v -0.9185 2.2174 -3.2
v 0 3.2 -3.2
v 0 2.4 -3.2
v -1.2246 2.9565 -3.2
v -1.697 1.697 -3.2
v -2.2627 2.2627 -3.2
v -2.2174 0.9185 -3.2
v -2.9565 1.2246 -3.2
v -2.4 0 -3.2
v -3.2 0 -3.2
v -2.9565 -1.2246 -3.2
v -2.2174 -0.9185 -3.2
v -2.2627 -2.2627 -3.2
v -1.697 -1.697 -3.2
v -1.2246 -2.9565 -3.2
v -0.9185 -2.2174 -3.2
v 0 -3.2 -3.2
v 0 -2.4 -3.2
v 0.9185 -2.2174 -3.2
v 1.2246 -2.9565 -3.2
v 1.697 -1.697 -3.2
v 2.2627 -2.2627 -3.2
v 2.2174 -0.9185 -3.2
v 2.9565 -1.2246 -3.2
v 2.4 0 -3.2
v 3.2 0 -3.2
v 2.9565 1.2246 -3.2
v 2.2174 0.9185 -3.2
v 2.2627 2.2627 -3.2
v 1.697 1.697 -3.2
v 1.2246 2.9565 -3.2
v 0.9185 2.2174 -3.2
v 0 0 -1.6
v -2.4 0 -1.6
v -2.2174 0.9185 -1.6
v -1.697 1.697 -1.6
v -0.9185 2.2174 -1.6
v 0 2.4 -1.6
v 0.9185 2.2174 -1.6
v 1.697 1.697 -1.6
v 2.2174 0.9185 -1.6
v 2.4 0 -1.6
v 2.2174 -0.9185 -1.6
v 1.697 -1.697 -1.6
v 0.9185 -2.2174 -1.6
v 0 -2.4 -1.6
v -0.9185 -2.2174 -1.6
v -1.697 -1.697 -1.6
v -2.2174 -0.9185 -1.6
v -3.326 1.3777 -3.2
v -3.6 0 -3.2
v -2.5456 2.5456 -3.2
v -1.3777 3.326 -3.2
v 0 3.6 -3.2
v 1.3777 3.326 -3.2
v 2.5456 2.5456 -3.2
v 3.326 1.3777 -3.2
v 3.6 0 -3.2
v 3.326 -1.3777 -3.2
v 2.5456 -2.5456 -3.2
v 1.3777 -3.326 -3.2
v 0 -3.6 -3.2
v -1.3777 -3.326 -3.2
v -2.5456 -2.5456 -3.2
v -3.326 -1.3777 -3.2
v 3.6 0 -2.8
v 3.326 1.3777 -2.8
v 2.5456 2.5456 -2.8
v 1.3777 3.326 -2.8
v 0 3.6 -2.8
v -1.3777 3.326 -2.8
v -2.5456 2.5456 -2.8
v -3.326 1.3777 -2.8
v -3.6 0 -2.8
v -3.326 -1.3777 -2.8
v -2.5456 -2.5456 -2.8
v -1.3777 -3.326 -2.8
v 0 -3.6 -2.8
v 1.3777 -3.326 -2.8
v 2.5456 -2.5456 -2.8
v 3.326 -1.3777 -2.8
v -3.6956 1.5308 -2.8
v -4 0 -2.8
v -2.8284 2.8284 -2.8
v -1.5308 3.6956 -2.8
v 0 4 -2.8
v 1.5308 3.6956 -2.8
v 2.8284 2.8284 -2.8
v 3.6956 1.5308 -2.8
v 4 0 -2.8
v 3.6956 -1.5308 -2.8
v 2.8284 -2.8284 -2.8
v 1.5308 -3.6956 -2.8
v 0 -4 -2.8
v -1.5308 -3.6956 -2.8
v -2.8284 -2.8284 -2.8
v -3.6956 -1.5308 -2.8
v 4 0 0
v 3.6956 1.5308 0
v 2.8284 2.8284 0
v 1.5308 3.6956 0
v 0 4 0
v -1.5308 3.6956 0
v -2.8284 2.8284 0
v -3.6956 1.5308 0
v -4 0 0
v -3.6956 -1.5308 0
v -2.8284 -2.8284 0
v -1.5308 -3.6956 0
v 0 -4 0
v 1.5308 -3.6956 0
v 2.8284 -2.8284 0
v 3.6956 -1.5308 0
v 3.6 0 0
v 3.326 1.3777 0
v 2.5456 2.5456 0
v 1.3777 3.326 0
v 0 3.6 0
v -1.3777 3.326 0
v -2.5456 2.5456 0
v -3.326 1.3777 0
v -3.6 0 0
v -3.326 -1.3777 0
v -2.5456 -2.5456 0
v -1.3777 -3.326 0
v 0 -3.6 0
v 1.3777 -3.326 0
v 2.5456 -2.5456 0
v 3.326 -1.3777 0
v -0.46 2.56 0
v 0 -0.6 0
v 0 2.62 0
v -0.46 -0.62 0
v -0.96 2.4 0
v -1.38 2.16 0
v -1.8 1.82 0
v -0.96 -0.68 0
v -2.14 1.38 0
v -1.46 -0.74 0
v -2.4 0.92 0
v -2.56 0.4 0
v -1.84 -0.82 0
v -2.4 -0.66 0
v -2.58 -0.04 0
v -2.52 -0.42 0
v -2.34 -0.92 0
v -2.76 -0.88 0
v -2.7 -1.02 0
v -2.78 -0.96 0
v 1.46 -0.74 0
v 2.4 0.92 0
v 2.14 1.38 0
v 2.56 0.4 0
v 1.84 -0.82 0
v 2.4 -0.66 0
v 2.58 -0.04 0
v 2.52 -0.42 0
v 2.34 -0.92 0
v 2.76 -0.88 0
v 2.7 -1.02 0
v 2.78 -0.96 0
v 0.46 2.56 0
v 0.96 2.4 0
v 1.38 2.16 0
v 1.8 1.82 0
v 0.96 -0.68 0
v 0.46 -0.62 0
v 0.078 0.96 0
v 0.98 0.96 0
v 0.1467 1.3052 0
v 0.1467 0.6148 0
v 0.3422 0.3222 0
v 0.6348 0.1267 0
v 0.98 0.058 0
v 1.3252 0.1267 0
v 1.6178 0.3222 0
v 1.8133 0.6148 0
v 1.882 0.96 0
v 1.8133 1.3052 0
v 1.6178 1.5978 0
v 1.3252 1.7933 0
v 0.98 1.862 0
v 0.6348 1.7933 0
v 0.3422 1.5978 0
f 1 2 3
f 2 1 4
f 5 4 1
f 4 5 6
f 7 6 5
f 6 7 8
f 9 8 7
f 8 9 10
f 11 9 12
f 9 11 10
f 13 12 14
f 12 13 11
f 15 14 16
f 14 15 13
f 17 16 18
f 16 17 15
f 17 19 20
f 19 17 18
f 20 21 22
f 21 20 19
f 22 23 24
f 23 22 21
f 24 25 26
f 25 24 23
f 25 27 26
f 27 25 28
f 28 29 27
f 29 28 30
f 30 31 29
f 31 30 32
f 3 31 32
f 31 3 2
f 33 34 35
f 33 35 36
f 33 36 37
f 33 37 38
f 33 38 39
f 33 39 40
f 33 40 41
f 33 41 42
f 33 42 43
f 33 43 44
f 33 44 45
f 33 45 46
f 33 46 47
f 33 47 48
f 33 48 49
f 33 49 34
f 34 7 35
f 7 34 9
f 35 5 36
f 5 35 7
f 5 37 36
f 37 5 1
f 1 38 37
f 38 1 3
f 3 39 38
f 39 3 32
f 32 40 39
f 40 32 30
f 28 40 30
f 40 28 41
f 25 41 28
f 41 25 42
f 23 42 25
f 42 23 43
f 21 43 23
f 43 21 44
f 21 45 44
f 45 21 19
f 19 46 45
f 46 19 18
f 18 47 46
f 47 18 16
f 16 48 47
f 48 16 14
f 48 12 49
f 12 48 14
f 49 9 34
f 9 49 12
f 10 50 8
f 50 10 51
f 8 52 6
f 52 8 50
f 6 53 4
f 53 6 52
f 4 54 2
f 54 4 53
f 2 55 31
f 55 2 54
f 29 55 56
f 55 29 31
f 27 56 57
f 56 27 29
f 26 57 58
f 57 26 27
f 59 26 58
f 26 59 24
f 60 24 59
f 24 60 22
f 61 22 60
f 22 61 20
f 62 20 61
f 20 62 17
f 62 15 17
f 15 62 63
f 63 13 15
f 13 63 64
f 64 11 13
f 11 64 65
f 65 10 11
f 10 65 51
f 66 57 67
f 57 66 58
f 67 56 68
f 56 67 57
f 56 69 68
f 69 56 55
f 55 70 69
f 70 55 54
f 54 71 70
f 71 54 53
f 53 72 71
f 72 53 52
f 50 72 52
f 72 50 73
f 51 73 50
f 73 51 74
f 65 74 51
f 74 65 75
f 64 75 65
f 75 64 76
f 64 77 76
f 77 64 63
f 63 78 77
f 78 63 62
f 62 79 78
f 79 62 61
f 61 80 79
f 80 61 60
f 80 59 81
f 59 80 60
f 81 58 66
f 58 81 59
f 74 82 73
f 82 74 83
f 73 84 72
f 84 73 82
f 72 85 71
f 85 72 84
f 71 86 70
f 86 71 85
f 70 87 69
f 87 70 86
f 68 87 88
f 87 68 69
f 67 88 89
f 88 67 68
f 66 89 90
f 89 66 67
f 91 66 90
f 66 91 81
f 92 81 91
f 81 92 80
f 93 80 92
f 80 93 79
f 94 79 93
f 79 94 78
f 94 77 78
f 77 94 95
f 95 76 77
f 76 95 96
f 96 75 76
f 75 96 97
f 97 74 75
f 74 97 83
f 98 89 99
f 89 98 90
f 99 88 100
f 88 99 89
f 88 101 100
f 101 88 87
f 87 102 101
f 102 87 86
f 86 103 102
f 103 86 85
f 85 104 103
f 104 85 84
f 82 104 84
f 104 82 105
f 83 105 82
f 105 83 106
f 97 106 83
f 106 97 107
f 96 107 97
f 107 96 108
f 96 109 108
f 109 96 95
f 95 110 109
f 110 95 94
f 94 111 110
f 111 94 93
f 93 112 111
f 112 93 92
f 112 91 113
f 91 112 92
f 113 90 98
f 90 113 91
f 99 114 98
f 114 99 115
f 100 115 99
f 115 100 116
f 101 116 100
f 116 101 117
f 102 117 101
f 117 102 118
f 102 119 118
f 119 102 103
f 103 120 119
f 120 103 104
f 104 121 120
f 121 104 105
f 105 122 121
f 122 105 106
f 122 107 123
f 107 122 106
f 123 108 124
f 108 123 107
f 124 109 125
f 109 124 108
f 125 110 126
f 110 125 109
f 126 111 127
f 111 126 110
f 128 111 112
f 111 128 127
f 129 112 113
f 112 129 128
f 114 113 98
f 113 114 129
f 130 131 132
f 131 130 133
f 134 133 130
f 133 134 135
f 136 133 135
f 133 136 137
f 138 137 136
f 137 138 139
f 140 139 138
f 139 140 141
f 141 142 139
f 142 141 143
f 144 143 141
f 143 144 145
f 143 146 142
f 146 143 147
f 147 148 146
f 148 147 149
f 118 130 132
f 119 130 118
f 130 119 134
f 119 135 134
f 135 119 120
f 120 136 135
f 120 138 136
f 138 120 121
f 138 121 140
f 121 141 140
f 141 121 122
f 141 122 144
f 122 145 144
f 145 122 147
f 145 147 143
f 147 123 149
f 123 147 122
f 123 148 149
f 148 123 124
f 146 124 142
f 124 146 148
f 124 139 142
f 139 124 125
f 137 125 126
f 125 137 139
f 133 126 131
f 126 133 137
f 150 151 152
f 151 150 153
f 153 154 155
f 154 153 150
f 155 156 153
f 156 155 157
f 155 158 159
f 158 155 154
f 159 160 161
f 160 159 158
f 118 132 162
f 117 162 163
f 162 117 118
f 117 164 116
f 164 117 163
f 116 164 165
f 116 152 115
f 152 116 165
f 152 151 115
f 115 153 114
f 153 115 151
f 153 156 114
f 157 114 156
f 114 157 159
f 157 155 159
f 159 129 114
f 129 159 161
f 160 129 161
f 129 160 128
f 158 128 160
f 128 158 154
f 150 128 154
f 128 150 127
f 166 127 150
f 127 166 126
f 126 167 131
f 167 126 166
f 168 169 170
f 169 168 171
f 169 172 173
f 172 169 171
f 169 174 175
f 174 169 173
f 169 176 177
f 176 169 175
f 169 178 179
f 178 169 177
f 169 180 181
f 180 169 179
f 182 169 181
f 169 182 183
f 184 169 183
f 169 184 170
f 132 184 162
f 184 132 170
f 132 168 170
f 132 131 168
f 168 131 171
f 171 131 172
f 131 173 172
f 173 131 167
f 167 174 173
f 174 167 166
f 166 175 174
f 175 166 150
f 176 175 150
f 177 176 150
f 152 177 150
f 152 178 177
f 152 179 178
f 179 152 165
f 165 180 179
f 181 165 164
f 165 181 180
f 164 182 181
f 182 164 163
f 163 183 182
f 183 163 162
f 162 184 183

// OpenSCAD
use <../lib.scad>
use <../p/4-4ering.scad>
use <s/98138s01.scad>
$fa=1; $fs=0.2;
function ldraw_lib__98138p0b(realsolid=false) = [
// 0 Tile  1 x  1 Round with Eye Half Closed Pattern
// 0 Name: 98138p0b.dat
// 0 Author: Philippe Hurbain [Philo]
// 0 !LDRAW_ORG Part UPDATE 2015-01
// 0 !LICENSE Licensed under CC BY 2.0 and CC BY 4.0 : see CAreadme.txt
// 
// 0 BFC CERTIFY CCW
  [0,"BFC","CERTIFY"],
  [0,"BFC","CCW"],
// 
// 0 !HISTORY 2015-10-11 [PTadmin] Official Update 2015-01
// 
// 
// 1 16 0 0 0 1 0 0 0 1 0 0 0 1 s\98138s01.dat
  [1,16,0,0,0,1,0,0,0,1,0,0,0,1, ldraw_lib__s__98138s01(realsolid)],
// 1 16 0 0 0 9 0 0 0 1 0 0 0 9 4-4ering.dat
  [1,16,0,0,0,9,0,0,0,1,0,0,0,9, ldraw_lib__4_4ering(realsolid)],
// 4 0 -1.15 0 -1.55 0 0 -1.5 0 0 6.55 -1.15 0 6.4
  [4,0,-1.15,0,-1.55,0,0,-1.5,0,0,6.55,-1.15,0,6.4],
// 4 0 -1.15 0 -1.55 -1.15 0 6.4 -2.4 0 6 -3.45 0 5.4
  [4,0,-1.15,0,-1.55,-1.15,0,6.4,-2.4,0,6,-3.45,0,5.4],
// 4 0 -2.4 0 -1.7 -1.15 0 -1.55 -3.45 0 5.4 -4.5 0 4.55
  [4,0,-2.4,0,-1.7,-1.15,0,-1.55,-3.45,0,5.4,-4.5,0,4.55],
// 4 0 -2.4 0 -1.7 -4.5 0 4.55 -5.35 0 3.45 -3.65 0 -1.85
  [4,0,-2.4,0,-1.7,-4.5,0,4.55,-5.35,0,3.45,-3.65,0,-1.85],
// 4 0 -3.65 0 -1.85 -5.35 0 3.45 -6 0 2.3 -6.4 0 1
  [4,0,-3.65,0,-1.85,-5.35,0,3.45,-6,0,2.3,-6.4,0,1],
// 4 0 -4.6 0 -2.05 -3.65 0 -1.85 -6.4 0 1 -6 0 -1.65
  [4,0,-4.6,0,-2.05,-3.65,0,-1.85,-6.4,0,1,-6,0,-1.65],
// 4 0 -6 0 -1.65 -6.4 0 1 -6.45 0 -0.1 -6.3 0 -1.05
  [4,0,-6,0,-1.65,-6.4,0,1,-6.45,0,-0.1,-6.3,0,-1.05],
// 4 0 -5.85 0 -2.3 -4.6 0 -2.05 -6 0 -1.65 -6.9 0 -2.2
  [4,0,-5.85,0,-2.3,-4.6,0,-2.05,-6,0,-1.65,-6.9,0,-2.2],
// 4 0 -6.75 0 -2.55 -5.85 0 -2.3 -6.9 0 -2.2 -6.95 0 -2.4
  [4,0,-6.75,0,-2.55,-5.85,0,-2.3,-6.9,0,-2.2,-6.95,0,-2.4],
// 3 16 0 0 9 -1.15 0 6.4 0 0 6.55
  [3,16,0,0,9,-1.15,0,6.4,0,0,6.55],
// 4 16 -2.4 0 6 -1.15 0 6.4 0 0 9 -3.4443 0 8.3151
  [4,16,-2.4,0,6,-1.15,0,6.4,0,0,9,-3.4443,0,8.3151],
// 4 16 -3.45 0 5.4 -2.4 0 6 -3.4443 0 8.3151 -6.3639 0 6.3639
  [4,16,-3.45,0,5.4,-2.4,0,6,-3.4443,0,8.3151,-6.3639,0,6.3639],
// 3 16 -6.3639 0 6.3639 -4.5 0 4.55 -3.45 0 5.4
  [3,16,-6.3639,0,6.3639,-4.5,0,4.55,-3.45,0,5.4],
// 4 16 -5.35 0 3.45 -4.5 0 4.55 -6.3639 0 6.3639 -8.3151 0 3.4443
  [4,16,-5.35,0,3.45,-4.5,0,4.55,-6.3639,0,6.3639,-8.3151,0,3.4443],
// 3 16 -5.35 0 3.45 -8.3151 0 3.4443 -6 0 2.3
  [3,16,-5.35,0,3.45,-8.3151,0,3.4443,-6,0,2.3],
// 4 16 -6.4 0 1 -6 0 2.3 -8.3151 0 3.4443 -9 0 0
  [4,16,-6.4,0,1,-6,0,2.3,-8.3151,0,3.4443,-9,0,0],
// 3 16 -6.4 0 1 -9 0 0 -6.45 0 -0.1
  [3,16,-6.4,0,1,-9,0,0,-6.45,0,-0.1],
// 4 16 -6.3 0 -1.05 -6.45 0 -0.1 -9 0 0 -6.9 0 -2.2
  [4,16,-6.3,0,-1.05,-6.45,0,-0.1,-9,0,0,-6.9,0,-2.2],
// 3 16 -6.3 0 -1.05 -6.9 0 -2.2 -6 0 -1.65
  [3,16,-6.3,0,-1.05,-6.9,0,-2.2,-6,0,-1.65],
// 4 16 -6.95 0 -2.4 -6.9 0 -2.2 -9 0 0 -8.3151 0 -3.4443
  [4,16,-6.95,0,-2.4,-6.9,0,-2.2,-9,0,0,-8.3151,0,-3.4443],
// 4 16 -6.75 0 -2.55 -6.95 0 -2.4 -8.3151 0 -3.4443 -6.3639 0 -6.3639
  [4,16,-6.75,0,-2.55,-6.95,0,-2.4,-8.3151,0,-3.4443,-6.3639,0,-6.3639],
// 4 16 -5.85 0 -2.3 -6.75 0 -2.55 -6.3639 0 -6.3639 -4.6 0 -2.05
  [4,16,-5.85,0,-2.3,-6.75,0,-2.55,-6.3639,0,-6.3639,-4.6,0,-2.05],
// 4 16 -4.6 0 -2.05 -6.3639 0 -6.3639 -3.4443 0 -8.3151 -3.65 0 -1.85
  [4,16,-4.6,0,-2.05,-6.3639,0,-6.3639,-3.4443,0,-8.3151,-3.65,0,-1.85],
// 4 16 -2.4 0 -1.7 -3.65 0 -1.85 -3.4443 0 -8.3151 0 0 -9
  [4,16,-2.4,0,-1.7,-3.65,0,-1.85,-3.4443,0,-8.3151,0,0,-9],
// 4 16 -1.15 0 -1.55 -2.4 0 -1.7 0 0 -9 0 0 -1.5
  [4,16,-1.15,0,-1.55,-2.4,0,-1.7,0,0,-9,0,0,-1.5],
// 4 0 6 0 2.3 5.35 0 3.45 3.65 0 -1.85 6.4 0 1
  [4,0,6,0,2.3,5.35,0,3.45,3.65,0,-1.85,6.4,0,1],
// 4 0 6.4 0 1 3.65 0 -1.85 4.6 0 -2.05 6 0 -1.65
  [4,0,6.4,0,1,3.65,0,-1.85,4.6,0,-2.05,6,0,-1.65],
// 4 0 6.45 0 -0.1 6.4 0 1 6 0 -1.65 6.3 0 -1.05
  [4,0,6.45,0,-0.1,6.4,0,1,6,0,-1.65,6.3,0,-1.05],
// 4 0 6 0 -1.65 4.6 0 -2.05 5.85 0 -2.3 6.9 0 -2.2
  [4,0,6,0,-1.65,4.6,0,-2.05,5.85,0,-2.3,6.9,0,-2.2],
// 4 0 6.9 0 -2.2 5.85 0 -2.3 6.75 0 -2.55 6.95 0 -2.4
  [4,0,6.9,0,-2.2,5.85,0,-2.3,6.75,0,-2.55,6.95,0,-2.4],
// 3 16 0 0 9 0 0 6.55 1.15 0 6.4
  [3,16,0,0,9,0,0,6.55,1.15,0,6.4],
// 4 16 0 0 9 1.15 0 6.4 2.4 0 6 3.4443 0 8.3151
  [4,16,0,0,9,1.15,0,6.4,2.4,0,6,3.4443,0,8.3151],
// 4 16 3.4443 0 8.3151 2.4 0 6 3.45 0 5.4 6.3639 0 6.3639
  [4,16,3.4443,0,8.3151,2.4,0,6,3.45,0,5.4,6.3639,0,6.3639],
// 3 16 6.3639 0 6.3639 3.45 0 5.4 4.5 0 4.55
  [3,16,6.3639,0,6.3639,3.45,0,5.4,4.5,0,4.55],
// 4 16 6.3639 0 6.3639 4.5 0 4.55 5.35 0 3.45 8.3151 0 3.4443
  [4,16,6.3639,0,6.3639,4.5,0,4.55,5.35,0,3.45,8.3151,0,3.4443],
// 3 16 5.35 0 3.45 6 0 2.3 8.3151 0 3.4443
  [3,16,5.35,0,3.45,6,0,2.3,8.3151,0,3.4443],
// 4 16 8.3151 0 3.4443 6 0 2.3 6.4 0 1 9 0 0
  [4,16,8.3151,0,3.4443,6,0,2.3,6.4,0,1,9,0,0],
// 3 16 6.4 0 1 6.45 0 -0.1 9 0 0
  [3,16,6.4,0,1,6.45,0,-0.1,9,0,0],
// 4 16 9 0 0 6.45 0 -0.1 6.3 0 -1.05 6.9 0 -2.2
  [4,16,9,0,0,6.45,0,-0.1,6.3,0,-1.05,6.9,0,-2.2],
// 3 16 6.3 0 -1.05 6 0 -1.65 6.9 0 -2.2
  [3,16,6.3,0,-1.05,6,0,-1.65,6.9,0,-2.2],
// 4 16 9 0 0 6.9 0 -2.2 6.95 0 -2.4 8.3151 0 -3.4443
  [4,16,9,0,0,6.9,0,-2.2,6.95,0,-2.4,8.3151,0,-3.4443],
// 4 16 8.3151 0 -3.4443 6.95 0 -2.4 6.75 0 -2.55 6.3639 0 -6.3639
  [4,16,8.3151,0,-3.4443,6.95,0,-2.4,6.75,0,-2.55,6.3639,0,-6.3639],
// 4 16 6.3639 0 -6.3639 6.75 0 -2.55 5.85 0 -2.3 4.6 0 -2.05
  [4,16,6.3639,0,-6.3639,6.75,0,-2.55,5.85,0,-2.3,4.6,0,-2.05],
// 4 16 3.4443 0 -8.3151 6.3639 0 -6.3639 4.6 0 -2.05 3.65 0 -1.85
  [4,16,3.4443,0,-8.3151,6.3639,0,-6.3639,4.6,0,-2.05,3.65,0,-1.85],
// 4 16 3.4443 0 -8.3151 3.65 0 -1.85 2.4 0 -1.7 0 0 -9
  [4,16,3.4443,0,-8.3151,3.65,0,-1.85,2.4,0,-1.7,0,0,-9],
// 4 16 0 0 -9 2.4 0 -1.7 1.15 0 -1.55 0 0 -1.5
  [4,16,0,0,-9,2.4,0,-1.7,1.15,0,-1.55,0,0,-1.5],
// 4 16 2.45 0 2.4 0.3667 0 3.263 0.195 0 2.4 0.3667 0 1.537
  [4,16,2.45,0,2.4,0.3667,0,3.263,0.195,0,2.4,0.3667,0,1.537],
// 4 16 2.45 0 2.4 0.3667 0 1.537 0.8555 0 0.8055 1.587 0 0.3167
  [4,16,2.45,0,2.4,0.3667,0,1.537,0.8555,0,0.8055,1.587,0,0.3167],
// 4 16 2.45 0 2.4 1.587 0 0.3167 2.45 0 0.145 3.313 0 0.3167
  [4,16,2.45,0,2.4,1.587,0,0.3167,2.45,0,0.145,3.313,0,0.3167],
// 4 16 2.45 0 2.4 3.313 0 0.3167 4.0445 0 0.8055 4.5333 0 1.537
  [4,16,2.45,0,2.4,3.313,0,0.3167,4.0445,0,0.8055,4.5333,0,1.537],
// 4 16 2.45 0 2.4 4.5333 0 1.537 4.705 0 2.4 4.5333 0 3.263
  [4,16,2.45,0,2.4,4.5333,0,1.537,4.705,0,2.4,4.5333,0,3.263],
// 4 16 2.45 0 2.4 4.5333 0 3.263 4.0445 0 3.9945 3.313 0 4.4833
  [4,16,2.45,0,2.4,4.5333,0,3.263,4.0445,0,3.9945,3.313,0,4.4833],
// 4 16 2.45 0 2.4 3.313 0 4.4833 2.45 0 4.655 1.587 0 4.4833
  [4,16,2.45,0,2.4,3.313,0,4.4833,2.45,0,4.655,1.587,0,4.4833],
// 4 16 2.45 0 2.4 1.587 0 4.4833 0.8555 0 3.9945 0.3667 0 3.263
  [4,16,2.45,0,2.4,1.587,0,4.4833,0.8555,0,3.9945,0.3667,0,3.263],
// 4 0 0 0 6.55 0.3667 0 3.263 0.8555 0 3.9945 1.15 0 6.4
  [4,0,0,0,6.55,0.3667,0,3.263,0.8555,0,3.9945,1.15,0,6.4],
// 3 0 0 0 6.55 0.195 0 2.4 0.3667 0 3.263
  [3,0,0,0,6.55,0.195,0,2.4,0.3667,0,3.263],
// 3 0 0 0 6.55 0 0 -1.5 0.195 0 2.4
  [3,0,0,0,6.55,0,0,-1.5,0.195,0,2.4],
// 3 0 0.195 0 2.4 0 0 -1.5 0.3667 0 1.537
  [3,0,0.195,0,2.4,0,0,-1.5,0.3667,0,1.537],
// 3 0 0.3667 0 1.537 0 0 -1.5 0.8555 0 0.8055
  [3,0,0.3667,0,1.537,0,0,-1.5,0.8555,0,0.8055],
// 4 0 1.587 0 0.3167 0.8555 0 0.8055 0 0 -1.5 1.15 0 -1.55
  [4,0,1.587,0,0.3167,0.8555,0,0.8055,0,0,-1.5,1.15,0,-1.55],
// 4 0 1.587 0 0.3167 1.15 0 -1.55 2.4 0 -1.7 2.45 0 0.145
  [4,0,1.587,0,0.3167,1.15,0,-1.55,2.4,0,-1.7,2.45,0,0.145],
// 4 0 2.45 0 0.145 2.4 0 -1.7 3.65 0 -1.85 3.313 0 0.3167
  [4,0,2.45,0,0.145,2.4,0,-1.7,3.65,0,-1.85,3.313,0,0.3167],
// 3 0 4.0445 0 0.8055 3.313 0 0.3167 3.65 0 -1.85
  [3,0,4.0445,0,0.8055,3.313,0,0.3167,3.65,0,-1.85],
// 3 0 4.5333 0 1.537 4.0445 0 0.8055 3.65 0 -1.85
  [3,0,4.5333,0,1.537,4.0445,0,0.8055,3.65,0,-1.85],
// 3 0 5.35 0 3.45 4.5333 0 1.537 3.65 0 -1.85
  [3,0,5.35,0,3.45,4.5333,0,1.537,3.65,0,-1.85],
// 3 0 5.35 0 3.45 4.705 0 2.4 4.5333 0 1.537
  [3,0,5.35,0,3.45,4.705,0,2.4,4.5333,0,1.537],
// 4 0 4.5333 0 3.263 4.705 0 2.4 5.35 0 3.45 4.5 0 4.55
  [4,0,4.5333,0,3.263,4.705,0,2.4,5.35,0,3.45,4.5,0,4.55],
// 3 0 4.5 0 4.55 4.0445 0 3.9945 4.5333 0 3.263
  [3,0,4.5,0,4.55,4.0445,0,3.9945,4.5333,0,3.263],
// 4 0 3.313 0 4.4833 4.0445 0 3.9945 4.5 0 4.55 3.45 0 5.4
  [4,0,3.313,0,4.4833,4.0445,0,3.9945,4.5,0,4.55,3.45,0,5.4],
// 4 0 2.45 0 4.655 3.313 0 4.4833 3.45 0 5.4 2.4 0 6
  [4,0,2.45,0,4.655,3.313,0,4.4833,3.45,0,5.4,2.4,0,6],
// 4 0 1.587 0 4.4833 2.45 0 4.655 2.4 0 6 1.15 0 6.4
  [4,0,1.587,0,4.4833,2.45,0,4.655,2.4,0,6,1.15,0,6.4],
// 3 0 1.15 0 6.4 0.8555 0 3.9945 1.587 0 4.4833
  [3,0,1.15,0,6.4,0.8555,0,3.9945,1.587,0,4.4833],
];
module ldraw_lib__98138p0b(step=0, col=false, unit=2/5, alt=false, line=0.2, solid=!$preview)
    makepoly(ldraw_lib__98138p0b(solid), step=step, col=col, unit=unit, alt=alt, line=line, solid=solid);
ldraw_lib__98138p0b(line=0.2);
